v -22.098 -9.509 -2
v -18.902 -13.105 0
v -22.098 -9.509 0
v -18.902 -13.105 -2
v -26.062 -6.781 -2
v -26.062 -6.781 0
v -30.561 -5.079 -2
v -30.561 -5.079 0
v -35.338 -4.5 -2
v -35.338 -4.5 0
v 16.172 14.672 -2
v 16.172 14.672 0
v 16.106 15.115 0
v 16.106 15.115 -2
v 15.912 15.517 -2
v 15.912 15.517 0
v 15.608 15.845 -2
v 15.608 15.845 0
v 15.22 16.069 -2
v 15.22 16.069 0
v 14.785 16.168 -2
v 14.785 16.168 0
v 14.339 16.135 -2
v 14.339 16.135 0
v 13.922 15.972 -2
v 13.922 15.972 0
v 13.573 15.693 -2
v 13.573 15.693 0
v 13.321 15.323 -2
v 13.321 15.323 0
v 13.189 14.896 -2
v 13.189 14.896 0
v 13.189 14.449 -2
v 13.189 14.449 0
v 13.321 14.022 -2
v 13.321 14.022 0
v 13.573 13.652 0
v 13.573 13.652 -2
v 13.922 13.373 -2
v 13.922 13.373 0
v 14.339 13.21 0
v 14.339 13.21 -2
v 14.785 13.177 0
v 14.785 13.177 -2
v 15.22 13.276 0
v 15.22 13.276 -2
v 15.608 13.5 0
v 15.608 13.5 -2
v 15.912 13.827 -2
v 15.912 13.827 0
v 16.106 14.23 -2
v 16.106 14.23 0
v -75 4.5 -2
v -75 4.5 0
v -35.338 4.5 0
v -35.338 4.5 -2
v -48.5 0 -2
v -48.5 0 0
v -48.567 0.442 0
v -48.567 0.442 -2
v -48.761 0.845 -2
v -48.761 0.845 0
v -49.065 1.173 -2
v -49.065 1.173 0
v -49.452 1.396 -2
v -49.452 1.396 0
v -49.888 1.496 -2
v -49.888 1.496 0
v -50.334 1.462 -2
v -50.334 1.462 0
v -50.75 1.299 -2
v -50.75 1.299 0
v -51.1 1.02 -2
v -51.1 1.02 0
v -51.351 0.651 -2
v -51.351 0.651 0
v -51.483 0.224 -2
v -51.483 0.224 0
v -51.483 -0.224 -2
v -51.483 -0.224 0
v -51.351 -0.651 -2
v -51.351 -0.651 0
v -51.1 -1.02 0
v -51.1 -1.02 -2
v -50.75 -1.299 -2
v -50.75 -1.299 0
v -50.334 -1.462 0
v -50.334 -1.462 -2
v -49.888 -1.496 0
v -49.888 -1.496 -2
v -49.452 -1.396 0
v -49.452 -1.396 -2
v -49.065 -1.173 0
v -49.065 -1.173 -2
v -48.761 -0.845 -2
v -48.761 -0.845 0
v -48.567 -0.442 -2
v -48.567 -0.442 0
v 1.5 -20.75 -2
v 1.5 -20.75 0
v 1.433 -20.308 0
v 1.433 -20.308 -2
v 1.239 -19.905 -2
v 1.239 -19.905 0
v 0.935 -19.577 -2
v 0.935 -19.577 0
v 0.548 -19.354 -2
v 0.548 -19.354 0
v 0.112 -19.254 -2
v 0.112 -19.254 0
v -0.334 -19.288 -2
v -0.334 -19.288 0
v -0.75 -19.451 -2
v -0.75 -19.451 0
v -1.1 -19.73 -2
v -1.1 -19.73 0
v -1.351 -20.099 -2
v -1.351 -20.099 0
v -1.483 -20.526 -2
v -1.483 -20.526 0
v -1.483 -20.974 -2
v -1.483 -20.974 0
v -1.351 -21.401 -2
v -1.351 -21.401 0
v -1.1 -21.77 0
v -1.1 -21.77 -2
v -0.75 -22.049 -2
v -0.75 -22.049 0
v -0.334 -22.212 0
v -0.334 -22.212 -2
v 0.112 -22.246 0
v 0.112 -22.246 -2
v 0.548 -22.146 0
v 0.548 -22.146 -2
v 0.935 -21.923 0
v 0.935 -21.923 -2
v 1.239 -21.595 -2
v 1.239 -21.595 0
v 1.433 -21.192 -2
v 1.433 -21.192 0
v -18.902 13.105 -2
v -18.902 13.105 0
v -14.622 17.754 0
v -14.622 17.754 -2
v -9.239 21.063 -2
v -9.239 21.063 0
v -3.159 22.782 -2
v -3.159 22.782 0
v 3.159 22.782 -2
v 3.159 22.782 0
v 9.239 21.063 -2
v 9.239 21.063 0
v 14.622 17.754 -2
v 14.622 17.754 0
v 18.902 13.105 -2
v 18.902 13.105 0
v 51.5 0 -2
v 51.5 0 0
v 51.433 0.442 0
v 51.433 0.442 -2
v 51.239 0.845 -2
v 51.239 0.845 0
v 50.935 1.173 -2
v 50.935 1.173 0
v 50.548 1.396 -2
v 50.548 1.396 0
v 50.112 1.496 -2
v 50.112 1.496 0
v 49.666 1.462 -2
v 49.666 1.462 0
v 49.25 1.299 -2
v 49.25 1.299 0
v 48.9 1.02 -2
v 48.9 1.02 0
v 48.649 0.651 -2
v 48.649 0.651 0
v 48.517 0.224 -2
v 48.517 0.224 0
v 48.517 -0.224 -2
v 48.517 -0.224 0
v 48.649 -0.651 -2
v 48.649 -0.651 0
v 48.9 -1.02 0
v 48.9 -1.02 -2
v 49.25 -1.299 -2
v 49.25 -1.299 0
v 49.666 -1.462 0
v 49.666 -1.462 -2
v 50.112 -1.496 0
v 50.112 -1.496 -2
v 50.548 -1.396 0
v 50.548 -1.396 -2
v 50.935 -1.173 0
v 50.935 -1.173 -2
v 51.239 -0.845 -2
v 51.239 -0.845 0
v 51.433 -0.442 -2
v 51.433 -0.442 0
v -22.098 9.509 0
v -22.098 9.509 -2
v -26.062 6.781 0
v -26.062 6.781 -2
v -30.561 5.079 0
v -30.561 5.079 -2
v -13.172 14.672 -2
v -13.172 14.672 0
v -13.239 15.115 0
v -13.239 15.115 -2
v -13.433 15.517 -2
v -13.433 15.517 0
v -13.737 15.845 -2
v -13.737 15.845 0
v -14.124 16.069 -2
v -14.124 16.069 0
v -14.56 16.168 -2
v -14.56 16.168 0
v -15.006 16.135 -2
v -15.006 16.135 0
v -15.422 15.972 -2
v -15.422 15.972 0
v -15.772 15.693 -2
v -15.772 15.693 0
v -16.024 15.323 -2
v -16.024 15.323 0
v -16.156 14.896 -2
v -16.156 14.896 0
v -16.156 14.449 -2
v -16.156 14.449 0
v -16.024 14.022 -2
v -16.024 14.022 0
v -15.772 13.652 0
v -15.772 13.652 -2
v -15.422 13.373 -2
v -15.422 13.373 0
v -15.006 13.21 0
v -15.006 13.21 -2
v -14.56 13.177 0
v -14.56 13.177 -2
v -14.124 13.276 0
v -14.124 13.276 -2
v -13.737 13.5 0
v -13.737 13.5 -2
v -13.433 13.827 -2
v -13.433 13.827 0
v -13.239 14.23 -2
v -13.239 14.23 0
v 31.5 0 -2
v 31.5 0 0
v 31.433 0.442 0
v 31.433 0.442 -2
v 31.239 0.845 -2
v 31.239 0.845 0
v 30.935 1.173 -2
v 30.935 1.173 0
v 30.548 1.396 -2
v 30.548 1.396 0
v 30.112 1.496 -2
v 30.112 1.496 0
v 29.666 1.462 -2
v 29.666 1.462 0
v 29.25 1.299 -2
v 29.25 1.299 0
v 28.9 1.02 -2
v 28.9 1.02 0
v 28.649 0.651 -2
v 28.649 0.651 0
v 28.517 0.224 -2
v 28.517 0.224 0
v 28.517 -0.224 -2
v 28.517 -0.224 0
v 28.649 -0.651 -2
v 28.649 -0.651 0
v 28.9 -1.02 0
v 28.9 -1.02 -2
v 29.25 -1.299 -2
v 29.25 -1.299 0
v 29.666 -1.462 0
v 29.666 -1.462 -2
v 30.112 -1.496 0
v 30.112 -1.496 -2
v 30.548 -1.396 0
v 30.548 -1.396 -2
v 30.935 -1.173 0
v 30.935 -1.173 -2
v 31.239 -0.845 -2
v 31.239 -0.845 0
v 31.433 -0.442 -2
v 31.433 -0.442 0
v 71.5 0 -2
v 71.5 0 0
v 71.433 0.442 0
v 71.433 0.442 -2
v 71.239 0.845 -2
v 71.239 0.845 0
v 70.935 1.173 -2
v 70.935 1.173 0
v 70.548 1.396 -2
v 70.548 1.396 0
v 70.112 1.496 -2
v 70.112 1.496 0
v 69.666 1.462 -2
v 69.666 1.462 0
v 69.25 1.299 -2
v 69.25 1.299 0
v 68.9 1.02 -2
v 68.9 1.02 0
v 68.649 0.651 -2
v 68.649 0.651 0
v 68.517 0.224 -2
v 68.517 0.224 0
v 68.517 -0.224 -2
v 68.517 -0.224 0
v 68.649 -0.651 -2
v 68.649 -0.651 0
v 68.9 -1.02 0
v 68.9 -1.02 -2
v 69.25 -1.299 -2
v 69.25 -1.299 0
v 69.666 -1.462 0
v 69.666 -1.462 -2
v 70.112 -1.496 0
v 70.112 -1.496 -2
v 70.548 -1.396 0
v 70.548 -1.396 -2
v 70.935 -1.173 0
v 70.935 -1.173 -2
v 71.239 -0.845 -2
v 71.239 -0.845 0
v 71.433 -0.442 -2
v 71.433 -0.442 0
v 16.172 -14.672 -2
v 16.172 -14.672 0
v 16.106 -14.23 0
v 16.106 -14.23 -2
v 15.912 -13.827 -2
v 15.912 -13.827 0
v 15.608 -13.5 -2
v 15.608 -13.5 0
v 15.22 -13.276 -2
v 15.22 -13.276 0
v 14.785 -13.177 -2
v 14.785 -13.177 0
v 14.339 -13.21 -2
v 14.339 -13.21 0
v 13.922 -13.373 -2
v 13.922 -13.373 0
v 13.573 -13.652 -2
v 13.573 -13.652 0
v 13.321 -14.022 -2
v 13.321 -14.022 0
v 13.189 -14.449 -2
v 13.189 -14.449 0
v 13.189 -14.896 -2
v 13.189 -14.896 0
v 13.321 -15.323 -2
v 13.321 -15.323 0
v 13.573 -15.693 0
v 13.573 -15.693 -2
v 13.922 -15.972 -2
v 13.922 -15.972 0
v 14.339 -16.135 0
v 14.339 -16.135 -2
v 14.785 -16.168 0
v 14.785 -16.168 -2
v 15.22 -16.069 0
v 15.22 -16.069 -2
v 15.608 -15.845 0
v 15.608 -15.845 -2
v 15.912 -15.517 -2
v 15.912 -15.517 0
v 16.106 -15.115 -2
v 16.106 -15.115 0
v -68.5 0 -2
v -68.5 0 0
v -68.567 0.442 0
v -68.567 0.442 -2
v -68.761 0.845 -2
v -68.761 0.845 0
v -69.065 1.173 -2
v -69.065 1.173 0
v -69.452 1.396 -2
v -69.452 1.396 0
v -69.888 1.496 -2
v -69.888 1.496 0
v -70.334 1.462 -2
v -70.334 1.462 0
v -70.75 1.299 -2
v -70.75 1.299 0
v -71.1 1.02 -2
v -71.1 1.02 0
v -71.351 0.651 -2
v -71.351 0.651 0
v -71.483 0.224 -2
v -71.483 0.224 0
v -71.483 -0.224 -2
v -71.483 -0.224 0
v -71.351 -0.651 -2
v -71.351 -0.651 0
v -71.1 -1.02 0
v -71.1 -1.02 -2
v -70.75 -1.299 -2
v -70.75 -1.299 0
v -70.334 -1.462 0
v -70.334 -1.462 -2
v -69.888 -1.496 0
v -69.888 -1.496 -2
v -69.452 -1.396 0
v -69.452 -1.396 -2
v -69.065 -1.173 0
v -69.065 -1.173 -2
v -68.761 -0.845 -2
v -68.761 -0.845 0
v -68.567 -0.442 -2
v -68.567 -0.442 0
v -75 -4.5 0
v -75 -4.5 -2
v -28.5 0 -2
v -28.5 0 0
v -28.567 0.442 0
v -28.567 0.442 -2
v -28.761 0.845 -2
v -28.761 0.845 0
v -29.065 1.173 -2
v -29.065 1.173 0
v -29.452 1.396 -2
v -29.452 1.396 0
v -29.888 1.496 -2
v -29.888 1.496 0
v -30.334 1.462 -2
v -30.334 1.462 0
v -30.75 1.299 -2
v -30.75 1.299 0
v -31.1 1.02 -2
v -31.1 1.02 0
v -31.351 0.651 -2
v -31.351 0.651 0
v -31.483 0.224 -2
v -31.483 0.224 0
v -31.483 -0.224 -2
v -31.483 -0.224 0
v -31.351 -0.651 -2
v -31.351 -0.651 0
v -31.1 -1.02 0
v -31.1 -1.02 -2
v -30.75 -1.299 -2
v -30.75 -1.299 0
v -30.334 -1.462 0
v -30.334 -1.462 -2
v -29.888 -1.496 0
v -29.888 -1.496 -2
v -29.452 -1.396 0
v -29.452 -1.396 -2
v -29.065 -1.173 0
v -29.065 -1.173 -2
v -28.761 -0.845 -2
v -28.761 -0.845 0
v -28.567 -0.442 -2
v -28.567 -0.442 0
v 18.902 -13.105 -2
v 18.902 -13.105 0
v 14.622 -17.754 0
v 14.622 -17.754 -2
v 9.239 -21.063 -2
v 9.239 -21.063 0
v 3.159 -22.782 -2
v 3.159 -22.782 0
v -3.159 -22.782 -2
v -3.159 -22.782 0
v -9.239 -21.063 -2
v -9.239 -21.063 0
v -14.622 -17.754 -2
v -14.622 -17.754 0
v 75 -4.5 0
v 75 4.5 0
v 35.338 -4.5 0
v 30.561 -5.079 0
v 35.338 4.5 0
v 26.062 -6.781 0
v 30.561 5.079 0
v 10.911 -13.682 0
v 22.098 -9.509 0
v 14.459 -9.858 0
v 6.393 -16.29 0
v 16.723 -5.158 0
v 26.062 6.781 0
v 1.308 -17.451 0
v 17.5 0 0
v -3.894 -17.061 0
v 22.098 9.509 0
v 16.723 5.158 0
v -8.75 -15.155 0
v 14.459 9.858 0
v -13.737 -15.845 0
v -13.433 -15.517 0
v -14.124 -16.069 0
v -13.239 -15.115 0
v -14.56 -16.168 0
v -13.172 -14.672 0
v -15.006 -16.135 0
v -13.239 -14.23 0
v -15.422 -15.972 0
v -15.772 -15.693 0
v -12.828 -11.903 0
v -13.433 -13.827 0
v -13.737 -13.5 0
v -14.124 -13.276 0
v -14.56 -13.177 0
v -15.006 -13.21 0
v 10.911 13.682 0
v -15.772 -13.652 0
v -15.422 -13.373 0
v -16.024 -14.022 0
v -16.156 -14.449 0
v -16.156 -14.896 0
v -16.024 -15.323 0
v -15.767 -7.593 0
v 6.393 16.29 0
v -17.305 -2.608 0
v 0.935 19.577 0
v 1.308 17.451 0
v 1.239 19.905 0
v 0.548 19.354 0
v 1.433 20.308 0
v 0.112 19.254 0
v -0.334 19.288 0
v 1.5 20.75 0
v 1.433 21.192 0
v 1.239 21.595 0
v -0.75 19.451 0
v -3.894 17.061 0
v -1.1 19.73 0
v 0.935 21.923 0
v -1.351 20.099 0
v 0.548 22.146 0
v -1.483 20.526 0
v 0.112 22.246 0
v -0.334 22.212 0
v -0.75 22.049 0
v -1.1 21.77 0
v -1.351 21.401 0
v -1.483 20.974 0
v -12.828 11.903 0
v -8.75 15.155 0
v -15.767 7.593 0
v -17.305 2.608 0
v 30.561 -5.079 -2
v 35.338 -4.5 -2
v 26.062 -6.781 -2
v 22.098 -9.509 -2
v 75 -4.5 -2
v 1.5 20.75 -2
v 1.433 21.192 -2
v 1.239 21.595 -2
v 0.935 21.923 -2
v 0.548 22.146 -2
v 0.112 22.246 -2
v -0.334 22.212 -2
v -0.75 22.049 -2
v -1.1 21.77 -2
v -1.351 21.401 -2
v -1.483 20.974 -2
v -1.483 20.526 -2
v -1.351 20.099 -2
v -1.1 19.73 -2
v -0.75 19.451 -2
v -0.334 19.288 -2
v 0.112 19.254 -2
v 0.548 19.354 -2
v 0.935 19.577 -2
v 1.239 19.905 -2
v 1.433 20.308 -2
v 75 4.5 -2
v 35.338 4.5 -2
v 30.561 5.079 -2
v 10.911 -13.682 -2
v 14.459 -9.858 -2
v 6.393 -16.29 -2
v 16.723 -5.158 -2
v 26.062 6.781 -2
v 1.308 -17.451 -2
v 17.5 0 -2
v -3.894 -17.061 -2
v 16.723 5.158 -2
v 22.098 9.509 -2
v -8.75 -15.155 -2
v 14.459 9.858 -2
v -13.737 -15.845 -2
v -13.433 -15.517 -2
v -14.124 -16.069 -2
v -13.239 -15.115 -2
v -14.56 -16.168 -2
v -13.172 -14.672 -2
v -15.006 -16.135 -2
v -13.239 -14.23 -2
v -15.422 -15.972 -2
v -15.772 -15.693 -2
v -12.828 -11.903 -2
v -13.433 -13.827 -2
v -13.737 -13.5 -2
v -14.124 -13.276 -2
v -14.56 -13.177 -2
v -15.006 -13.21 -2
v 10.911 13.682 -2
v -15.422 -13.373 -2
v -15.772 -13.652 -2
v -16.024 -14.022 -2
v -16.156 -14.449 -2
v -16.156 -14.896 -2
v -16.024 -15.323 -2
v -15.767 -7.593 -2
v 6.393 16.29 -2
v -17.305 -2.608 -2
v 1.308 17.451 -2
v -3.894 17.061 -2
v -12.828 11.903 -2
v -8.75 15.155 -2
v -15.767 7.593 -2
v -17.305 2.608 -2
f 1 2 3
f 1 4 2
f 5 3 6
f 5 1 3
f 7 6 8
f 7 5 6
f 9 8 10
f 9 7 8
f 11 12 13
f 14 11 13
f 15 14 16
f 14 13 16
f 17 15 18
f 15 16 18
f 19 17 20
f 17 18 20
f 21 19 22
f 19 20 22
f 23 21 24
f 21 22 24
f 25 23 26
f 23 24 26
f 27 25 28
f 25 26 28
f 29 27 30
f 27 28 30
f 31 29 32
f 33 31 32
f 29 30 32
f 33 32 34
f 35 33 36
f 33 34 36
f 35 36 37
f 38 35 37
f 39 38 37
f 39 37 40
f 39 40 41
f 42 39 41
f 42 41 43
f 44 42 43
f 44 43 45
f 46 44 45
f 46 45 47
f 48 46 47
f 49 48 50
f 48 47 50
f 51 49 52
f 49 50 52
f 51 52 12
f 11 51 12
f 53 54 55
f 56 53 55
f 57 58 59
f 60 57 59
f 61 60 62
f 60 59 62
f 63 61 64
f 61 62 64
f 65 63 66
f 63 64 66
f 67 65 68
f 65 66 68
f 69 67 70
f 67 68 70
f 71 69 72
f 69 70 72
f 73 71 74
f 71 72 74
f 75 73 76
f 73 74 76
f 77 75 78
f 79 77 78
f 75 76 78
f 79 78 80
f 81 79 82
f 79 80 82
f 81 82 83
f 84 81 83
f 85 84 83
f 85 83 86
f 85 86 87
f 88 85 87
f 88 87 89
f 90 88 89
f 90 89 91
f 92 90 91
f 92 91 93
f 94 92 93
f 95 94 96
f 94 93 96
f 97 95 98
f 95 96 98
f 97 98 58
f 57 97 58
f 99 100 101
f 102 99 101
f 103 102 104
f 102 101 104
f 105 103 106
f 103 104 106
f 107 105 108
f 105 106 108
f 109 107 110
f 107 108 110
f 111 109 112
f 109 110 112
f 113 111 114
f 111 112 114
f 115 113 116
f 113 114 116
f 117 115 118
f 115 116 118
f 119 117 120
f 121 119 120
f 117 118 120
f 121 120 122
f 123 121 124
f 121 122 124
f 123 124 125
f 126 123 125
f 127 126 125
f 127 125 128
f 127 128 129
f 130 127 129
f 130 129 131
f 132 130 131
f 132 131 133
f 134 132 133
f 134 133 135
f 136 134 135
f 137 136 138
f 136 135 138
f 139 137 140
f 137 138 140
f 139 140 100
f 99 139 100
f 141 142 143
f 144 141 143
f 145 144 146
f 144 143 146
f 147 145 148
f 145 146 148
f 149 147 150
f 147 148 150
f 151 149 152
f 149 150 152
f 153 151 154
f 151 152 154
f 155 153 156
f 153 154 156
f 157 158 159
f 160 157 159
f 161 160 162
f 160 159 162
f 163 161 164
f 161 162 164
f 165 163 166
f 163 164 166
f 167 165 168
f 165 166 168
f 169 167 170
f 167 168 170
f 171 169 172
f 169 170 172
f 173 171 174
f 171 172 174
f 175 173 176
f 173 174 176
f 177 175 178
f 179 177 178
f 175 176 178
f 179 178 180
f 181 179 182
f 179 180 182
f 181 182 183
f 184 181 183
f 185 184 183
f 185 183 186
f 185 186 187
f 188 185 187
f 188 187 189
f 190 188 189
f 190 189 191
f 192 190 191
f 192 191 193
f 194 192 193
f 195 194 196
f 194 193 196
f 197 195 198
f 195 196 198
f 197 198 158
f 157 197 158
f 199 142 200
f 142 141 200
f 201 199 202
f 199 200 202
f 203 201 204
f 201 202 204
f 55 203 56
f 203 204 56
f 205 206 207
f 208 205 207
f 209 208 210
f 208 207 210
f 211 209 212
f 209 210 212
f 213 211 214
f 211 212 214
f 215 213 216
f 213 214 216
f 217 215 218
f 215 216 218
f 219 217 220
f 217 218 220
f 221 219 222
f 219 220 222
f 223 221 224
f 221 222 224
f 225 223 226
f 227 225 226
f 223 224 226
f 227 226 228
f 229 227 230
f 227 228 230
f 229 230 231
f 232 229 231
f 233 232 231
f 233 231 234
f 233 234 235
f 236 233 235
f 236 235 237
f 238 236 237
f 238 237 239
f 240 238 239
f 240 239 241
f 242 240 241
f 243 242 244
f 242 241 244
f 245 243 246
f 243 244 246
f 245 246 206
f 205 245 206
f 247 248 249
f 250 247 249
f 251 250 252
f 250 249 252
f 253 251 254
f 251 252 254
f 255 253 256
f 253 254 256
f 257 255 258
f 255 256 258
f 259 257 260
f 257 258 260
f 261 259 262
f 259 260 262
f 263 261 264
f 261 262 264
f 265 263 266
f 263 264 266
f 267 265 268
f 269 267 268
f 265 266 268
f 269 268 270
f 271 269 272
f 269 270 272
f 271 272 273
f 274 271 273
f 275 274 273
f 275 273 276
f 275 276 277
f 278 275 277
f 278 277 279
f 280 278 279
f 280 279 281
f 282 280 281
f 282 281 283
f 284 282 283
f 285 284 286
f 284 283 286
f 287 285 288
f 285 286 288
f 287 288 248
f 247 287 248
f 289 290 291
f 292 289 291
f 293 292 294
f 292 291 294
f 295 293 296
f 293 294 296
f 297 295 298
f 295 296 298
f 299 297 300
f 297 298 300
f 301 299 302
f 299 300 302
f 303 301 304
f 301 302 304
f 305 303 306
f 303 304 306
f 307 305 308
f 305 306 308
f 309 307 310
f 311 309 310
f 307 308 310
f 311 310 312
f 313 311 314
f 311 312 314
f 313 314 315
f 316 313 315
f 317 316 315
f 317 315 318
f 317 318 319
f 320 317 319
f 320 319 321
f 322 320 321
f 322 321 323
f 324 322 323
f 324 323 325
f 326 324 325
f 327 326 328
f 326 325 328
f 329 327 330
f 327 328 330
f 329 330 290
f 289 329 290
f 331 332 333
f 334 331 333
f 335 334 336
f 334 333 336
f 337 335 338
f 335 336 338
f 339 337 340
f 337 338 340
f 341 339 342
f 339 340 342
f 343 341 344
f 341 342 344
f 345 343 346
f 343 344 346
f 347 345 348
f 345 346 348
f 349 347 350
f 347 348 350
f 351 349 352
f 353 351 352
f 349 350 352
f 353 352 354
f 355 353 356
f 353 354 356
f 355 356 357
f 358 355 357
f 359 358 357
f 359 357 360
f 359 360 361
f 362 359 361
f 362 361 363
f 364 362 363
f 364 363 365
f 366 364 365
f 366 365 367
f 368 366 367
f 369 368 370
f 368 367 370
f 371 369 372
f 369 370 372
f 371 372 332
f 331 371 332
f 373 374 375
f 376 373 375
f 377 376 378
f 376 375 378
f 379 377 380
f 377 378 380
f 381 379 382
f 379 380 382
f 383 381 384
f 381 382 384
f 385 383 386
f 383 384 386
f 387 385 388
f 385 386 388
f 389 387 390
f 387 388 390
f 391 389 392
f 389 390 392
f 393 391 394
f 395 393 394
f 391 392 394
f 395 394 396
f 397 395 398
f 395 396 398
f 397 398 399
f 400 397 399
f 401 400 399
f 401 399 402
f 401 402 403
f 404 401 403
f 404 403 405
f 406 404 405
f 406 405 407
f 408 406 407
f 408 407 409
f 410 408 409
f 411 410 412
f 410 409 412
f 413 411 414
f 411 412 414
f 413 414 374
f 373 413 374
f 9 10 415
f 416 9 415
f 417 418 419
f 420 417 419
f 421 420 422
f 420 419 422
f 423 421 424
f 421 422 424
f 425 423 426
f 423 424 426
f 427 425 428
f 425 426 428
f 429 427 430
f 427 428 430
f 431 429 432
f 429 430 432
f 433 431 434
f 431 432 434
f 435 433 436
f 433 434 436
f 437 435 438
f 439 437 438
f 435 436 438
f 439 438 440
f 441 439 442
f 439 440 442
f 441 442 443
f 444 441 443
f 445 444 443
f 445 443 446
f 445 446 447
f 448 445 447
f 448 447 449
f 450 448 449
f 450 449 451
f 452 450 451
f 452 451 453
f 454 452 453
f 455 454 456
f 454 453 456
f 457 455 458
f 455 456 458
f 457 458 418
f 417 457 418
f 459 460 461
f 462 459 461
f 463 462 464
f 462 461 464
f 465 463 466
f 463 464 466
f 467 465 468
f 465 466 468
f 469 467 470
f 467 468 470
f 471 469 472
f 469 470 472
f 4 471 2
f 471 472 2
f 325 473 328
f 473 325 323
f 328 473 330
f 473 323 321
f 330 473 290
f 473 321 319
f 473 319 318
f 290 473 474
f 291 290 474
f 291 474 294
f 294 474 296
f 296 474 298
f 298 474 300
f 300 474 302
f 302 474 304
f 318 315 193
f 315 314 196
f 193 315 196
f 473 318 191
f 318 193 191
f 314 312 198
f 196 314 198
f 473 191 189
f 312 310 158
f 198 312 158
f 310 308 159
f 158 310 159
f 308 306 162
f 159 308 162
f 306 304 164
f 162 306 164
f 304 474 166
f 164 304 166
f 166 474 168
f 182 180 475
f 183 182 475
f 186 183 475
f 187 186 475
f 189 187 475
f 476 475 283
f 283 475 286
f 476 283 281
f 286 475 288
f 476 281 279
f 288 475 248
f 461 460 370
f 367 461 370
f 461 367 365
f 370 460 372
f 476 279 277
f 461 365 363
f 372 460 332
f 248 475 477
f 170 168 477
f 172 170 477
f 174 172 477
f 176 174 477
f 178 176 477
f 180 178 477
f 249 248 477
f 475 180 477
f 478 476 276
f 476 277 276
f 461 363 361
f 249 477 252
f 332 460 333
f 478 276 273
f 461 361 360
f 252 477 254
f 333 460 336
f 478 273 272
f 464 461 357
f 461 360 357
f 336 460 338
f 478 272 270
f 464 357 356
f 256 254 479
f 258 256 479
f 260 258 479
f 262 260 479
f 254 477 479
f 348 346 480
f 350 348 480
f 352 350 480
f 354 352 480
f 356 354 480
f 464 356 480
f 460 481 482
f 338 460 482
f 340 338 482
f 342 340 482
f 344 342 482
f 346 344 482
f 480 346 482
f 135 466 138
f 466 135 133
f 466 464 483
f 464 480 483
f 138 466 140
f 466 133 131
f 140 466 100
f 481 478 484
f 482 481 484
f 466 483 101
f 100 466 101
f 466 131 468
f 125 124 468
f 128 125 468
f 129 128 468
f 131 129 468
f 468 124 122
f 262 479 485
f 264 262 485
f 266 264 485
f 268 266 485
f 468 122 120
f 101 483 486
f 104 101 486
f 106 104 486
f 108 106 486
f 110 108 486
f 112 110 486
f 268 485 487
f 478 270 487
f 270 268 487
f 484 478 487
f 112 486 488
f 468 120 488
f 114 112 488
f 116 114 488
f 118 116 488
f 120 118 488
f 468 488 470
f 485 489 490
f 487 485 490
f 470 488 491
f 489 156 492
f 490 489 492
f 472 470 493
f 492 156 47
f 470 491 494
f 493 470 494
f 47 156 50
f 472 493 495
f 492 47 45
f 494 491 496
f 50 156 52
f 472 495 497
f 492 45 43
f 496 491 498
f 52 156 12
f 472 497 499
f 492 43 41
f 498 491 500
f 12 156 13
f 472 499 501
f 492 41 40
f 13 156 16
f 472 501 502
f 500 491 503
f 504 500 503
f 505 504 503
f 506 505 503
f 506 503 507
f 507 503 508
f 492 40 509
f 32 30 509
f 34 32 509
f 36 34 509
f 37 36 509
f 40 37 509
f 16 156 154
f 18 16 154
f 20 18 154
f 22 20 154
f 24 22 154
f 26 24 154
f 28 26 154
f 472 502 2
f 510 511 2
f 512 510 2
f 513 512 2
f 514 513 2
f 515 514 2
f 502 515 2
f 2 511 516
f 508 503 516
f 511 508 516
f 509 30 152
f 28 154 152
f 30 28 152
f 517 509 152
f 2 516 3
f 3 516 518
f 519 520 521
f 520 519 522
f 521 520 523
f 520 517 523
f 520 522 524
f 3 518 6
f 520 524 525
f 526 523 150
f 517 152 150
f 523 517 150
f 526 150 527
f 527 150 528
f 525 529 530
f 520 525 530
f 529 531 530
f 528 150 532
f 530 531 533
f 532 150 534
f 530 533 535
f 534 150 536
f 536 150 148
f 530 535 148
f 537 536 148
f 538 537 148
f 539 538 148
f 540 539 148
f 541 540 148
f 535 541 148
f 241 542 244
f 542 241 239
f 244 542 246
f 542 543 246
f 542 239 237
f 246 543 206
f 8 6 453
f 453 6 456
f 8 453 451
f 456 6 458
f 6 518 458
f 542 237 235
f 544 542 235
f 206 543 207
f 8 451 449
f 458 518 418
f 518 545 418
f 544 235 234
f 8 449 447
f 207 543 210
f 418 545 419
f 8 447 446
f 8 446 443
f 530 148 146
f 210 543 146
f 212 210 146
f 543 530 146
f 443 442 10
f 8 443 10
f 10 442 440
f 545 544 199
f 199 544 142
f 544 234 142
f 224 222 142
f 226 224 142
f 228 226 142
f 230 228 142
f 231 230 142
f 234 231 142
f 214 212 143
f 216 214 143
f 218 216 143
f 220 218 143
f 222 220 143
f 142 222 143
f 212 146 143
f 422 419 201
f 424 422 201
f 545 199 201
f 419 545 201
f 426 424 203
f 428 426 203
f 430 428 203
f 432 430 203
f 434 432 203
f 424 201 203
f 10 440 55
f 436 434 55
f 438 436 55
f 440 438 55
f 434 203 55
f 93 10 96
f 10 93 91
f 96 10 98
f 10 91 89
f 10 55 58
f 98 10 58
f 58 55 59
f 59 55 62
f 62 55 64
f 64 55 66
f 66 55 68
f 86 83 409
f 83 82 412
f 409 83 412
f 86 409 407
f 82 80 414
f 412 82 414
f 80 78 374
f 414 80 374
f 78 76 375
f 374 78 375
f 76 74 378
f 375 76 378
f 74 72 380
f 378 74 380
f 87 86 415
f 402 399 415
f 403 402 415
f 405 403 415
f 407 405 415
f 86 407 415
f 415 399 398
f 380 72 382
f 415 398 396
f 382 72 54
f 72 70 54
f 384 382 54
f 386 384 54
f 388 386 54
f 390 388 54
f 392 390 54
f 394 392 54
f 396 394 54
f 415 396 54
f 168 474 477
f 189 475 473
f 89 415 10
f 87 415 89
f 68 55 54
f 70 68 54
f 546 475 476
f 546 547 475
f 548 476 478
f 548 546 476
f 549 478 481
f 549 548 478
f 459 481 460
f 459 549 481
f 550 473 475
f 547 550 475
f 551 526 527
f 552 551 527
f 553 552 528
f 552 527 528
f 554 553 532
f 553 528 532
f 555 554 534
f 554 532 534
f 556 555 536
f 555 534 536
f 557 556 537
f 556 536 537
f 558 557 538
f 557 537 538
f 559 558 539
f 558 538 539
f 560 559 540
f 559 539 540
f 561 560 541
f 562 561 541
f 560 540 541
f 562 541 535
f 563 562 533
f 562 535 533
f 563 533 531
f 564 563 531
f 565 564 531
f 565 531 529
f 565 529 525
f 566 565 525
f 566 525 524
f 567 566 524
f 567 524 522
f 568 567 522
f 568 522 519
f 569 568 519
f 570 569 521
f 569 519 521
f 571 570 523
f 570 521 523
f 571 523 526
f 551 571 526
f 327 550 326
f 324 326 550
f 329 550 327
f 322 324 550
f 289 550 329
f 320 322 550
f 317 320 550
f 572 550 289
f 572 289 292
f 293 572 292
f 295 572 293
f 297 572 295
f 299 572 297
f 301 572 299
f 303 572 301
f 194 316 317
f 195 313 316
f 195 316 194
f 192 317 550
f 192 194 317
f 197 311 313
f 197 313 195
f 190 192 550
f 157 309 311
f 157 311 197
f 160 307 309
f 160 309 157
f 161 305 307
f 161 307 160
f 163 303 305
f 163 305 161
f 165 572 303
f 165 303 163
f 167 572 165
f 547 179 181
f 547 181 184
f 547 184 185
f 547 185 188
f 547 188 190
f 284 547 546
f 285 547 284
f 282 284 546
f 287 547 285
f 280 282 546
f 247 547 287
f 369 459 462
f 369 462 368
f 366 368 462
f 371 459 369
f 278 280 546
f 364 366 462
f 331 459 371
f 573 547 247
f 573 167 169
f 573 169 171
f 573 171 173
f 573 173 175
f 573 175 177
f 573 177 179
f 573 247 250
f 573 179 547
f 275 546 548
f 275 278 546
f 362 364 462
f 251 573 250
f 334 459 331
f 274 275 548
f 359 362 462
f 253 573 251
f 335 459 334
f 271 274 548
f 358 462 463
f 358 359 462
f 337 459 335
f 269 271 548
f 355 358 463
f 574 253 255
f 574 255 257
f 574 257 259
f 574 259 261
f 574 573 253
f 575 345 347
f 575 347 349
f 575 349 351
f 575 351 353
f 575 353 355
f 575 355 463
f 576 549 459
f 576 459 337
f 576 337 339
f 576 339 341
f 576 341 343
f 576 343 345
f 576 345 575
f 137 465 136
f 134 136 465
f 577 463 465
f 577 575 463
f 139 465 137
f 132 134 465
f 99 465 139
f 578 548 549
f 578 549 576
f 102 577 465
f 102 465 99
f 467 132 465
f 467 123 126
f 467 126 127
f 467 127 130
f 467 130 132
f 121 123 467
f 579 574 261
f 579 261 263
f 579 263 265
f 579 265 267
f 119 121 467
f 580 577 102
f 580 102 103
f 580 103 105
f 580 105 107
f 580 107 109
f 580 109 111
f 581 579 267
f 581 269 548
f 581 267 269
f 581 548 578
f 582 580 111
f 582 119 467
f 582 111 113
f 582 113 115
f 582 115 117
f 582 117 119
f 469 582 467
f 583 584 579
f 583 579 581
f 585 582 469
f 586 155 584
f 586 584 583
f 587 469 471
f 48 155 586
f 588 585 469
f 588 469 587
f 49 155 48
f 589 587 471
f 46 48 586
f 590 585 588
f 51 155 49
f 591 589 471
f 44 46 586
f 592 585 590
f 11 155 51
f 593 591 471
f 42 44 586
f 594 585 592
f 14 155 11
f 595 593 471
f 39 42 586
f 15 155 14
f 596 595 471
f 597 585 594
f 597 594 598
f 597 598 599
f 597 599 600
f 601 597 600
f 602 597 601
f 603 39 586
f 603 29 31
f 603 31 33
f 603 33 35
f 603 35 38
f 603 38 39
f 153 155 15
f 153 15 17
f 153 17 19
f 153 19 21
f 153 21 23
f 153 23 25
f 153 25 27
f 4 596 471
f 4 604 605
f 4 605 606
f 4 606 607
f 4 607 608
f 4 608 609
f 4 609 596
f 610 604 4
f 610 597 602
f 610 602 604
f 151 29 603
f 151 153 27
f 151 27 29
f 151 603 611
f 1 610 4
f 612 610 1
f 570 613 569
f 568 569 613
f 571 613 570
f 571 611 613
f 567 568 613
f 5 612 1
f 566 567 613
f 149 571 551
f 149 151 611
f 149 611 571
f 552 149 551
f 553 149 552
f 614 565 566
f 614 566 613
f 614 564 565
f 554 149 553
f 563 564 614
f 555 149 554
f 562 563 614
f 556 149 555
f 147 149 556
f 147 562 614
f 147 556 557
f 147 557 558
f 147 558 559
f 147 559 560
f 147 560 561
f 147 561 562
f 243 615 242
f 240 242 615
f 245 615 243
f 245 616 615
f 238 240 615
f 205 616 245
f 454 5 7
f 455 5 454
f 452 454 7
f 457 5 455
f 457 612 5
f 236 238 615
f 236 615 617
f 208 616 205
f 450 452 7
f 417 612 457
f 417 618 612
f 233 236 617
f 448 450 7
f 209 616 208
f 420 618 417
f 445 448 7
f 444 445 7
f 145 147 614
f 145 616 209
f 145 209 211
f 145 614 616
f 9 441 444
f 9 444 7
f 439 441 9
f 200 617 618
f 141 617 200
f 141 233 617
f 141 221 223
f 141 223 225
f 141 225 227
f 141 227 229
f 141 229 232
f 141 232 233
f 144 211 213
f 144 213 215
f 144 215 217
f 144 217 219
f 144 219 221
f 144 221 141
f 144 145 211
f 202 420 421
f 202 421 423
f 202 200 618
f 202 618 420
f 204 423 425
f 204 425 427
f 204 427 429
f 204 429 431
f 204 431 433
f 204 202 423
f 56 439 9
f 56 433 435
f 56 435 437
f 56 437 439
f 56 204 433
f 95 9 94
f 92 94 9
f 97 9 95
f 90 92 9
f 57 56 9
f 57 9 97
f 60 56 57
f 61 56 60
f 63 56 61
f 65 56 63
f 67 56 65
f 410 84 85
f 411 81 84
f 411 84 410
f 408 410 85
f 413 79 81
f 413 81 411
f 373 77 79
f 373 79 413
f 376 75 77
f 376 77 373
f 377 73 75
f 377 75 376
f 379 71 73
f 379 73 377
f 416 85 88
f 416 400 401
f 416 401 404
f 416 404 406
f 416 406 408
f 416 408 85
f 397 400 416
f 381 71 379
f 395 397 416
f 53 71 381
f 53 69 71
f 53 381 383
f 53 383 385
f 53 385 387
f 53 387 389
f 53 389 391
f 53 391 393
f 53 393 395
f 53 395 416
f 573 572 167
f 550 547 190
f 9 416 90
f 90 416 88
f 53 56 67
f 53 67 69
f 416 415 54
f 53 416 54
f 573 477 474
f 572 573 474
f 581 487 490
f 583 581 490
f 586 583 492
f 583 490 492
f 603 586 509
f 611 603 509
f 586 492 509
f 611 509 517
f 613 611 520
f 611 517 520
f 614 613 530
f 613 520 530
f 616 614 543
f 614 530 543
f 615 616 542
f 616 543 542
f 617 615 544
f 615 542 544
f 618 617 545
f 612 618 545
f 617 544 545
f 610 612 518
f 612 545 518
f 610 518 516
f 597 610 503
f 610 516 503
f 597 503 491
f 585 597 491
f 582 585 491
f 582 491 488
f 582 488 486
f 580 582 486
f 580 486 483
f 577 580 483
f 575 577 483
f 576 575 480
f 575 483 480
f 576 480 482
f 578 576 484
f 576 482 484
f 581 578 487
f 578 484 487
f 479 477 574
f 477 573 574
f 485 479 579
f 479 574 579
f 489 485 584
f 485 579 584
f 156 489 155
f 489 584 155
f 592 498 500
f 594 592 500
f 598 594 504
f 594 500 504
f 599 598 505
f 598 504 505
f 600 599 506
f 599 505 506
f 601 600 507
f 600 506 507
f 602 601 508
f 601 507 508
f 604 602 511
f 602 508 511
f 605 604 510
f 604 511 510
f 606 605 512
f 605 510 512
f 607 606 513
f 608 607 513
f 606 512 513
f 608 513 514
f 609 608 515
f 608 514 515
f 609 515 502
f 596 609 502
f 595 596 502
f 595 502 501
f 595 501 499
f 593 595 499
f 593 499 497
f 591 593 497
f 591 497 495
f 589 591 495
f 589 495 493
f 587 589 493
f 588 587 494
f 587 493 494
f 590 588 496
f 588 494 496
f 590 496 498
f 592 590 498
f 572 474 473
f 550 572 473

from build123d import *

# Parameters (mm, degrees)
SKETCH_1_R             = 1.5
SKETCH_1_R_2           = 17.5
SM_BASE_FLANGE_1_DEPTH = 2
FILLET_1_R             = 20


# Sheet-metal steps are written as plain solids
with BuildPart() as part:
    # Sketch 1 → 基体-法兰1 (new body)
    with BuildSketch(Plane.XY):
        with BuildLine():
            Line((22.555487137, 4.5), (75, 4.5))
            Line((75, 4.5), (75, -4.5))
            Line((75, -4.5), (22.555487137, -4.5))
            ThreePointArc((22.555487137, -4.5), (0, -23), (-22.555487137, -4.5))
            Line((-22.555487137, -4.5), (-75, -4.5))
            Line((-75, -4.5), (-75, 4.5))
            Line((-75, 4.5), (-22.555487137, 4.5))
            ThreePointArc((-22.555487137, 4.5), (0, 23), (22.555487137, 4.5))
        make_face()
        with Locations((0, 20.75)):
            Circle(SKETCH_1_R, mode=Mode.SUBTRACT)
        with Locations((14.67246571, 14.67246571)):
            Circle(SKETCH_1_R, mode=Mode.SUBTRACT)
        with Locations((14.67246571, -14.67246571)):
            Circle(SKETCH_1_R, mode=Mode.SUBTRACT)
        with Locations((0, -20.75)):
            Circle(SKETCH_1_R, mode=Mode.SUBTRACT)
        with Locations((-14.67246571, -14.67246571)):
            Circle(SKETCH_1_R, mode=Mode.SUBTRACT)
        with Locations((-14.67246571, 14.67246571)):
            Circle(SKETCH_1_R, mode=Mode.SUBTRACT)
        Circle(SKETCH_1_R_2, mode=Mode.SUBTRACT)
        with Locations((-70, 0)):
            Circle(SKETCH_1_R, mode=Mode.SUBTRACT)
        with Locations((-50, 0)):
            Circle(SKETCH_1_R, mode=Mode.SUBTRACT)
        with Locations((-30, 0)):
            Circle(SKETCH_1_R, mode=Mode.SUBTRACT)
        with Locations((30, 0)):
            Circle(SKETCH_1_R, mode=Mode.SUBTRACT)
        with Locations((50, 0)):
            Circle(SKETCH_1_R, mode=Mode.SUBTRACT)
        with Locations((70, 0)):
            Circle(SKETCH_1_R, mode=Mode.SUBTRACT)
    extrude(amount=-SM_BASE_FLANGE_1_DEPTH)

    # 圆角1
    fillet_1_edges = [part.edges().sort_by_distance(p)[0] for p in [
        (22.555487137, -4.5, -1),
        (-22.555487137, -4.5, -1),
        (-22.555487137, 4.5, -1),
        (22.555487137, 4.5, -1),
    ]]
    fillet(fillet_1_edges, radius=FILLET_1_R)


solid = part.part
